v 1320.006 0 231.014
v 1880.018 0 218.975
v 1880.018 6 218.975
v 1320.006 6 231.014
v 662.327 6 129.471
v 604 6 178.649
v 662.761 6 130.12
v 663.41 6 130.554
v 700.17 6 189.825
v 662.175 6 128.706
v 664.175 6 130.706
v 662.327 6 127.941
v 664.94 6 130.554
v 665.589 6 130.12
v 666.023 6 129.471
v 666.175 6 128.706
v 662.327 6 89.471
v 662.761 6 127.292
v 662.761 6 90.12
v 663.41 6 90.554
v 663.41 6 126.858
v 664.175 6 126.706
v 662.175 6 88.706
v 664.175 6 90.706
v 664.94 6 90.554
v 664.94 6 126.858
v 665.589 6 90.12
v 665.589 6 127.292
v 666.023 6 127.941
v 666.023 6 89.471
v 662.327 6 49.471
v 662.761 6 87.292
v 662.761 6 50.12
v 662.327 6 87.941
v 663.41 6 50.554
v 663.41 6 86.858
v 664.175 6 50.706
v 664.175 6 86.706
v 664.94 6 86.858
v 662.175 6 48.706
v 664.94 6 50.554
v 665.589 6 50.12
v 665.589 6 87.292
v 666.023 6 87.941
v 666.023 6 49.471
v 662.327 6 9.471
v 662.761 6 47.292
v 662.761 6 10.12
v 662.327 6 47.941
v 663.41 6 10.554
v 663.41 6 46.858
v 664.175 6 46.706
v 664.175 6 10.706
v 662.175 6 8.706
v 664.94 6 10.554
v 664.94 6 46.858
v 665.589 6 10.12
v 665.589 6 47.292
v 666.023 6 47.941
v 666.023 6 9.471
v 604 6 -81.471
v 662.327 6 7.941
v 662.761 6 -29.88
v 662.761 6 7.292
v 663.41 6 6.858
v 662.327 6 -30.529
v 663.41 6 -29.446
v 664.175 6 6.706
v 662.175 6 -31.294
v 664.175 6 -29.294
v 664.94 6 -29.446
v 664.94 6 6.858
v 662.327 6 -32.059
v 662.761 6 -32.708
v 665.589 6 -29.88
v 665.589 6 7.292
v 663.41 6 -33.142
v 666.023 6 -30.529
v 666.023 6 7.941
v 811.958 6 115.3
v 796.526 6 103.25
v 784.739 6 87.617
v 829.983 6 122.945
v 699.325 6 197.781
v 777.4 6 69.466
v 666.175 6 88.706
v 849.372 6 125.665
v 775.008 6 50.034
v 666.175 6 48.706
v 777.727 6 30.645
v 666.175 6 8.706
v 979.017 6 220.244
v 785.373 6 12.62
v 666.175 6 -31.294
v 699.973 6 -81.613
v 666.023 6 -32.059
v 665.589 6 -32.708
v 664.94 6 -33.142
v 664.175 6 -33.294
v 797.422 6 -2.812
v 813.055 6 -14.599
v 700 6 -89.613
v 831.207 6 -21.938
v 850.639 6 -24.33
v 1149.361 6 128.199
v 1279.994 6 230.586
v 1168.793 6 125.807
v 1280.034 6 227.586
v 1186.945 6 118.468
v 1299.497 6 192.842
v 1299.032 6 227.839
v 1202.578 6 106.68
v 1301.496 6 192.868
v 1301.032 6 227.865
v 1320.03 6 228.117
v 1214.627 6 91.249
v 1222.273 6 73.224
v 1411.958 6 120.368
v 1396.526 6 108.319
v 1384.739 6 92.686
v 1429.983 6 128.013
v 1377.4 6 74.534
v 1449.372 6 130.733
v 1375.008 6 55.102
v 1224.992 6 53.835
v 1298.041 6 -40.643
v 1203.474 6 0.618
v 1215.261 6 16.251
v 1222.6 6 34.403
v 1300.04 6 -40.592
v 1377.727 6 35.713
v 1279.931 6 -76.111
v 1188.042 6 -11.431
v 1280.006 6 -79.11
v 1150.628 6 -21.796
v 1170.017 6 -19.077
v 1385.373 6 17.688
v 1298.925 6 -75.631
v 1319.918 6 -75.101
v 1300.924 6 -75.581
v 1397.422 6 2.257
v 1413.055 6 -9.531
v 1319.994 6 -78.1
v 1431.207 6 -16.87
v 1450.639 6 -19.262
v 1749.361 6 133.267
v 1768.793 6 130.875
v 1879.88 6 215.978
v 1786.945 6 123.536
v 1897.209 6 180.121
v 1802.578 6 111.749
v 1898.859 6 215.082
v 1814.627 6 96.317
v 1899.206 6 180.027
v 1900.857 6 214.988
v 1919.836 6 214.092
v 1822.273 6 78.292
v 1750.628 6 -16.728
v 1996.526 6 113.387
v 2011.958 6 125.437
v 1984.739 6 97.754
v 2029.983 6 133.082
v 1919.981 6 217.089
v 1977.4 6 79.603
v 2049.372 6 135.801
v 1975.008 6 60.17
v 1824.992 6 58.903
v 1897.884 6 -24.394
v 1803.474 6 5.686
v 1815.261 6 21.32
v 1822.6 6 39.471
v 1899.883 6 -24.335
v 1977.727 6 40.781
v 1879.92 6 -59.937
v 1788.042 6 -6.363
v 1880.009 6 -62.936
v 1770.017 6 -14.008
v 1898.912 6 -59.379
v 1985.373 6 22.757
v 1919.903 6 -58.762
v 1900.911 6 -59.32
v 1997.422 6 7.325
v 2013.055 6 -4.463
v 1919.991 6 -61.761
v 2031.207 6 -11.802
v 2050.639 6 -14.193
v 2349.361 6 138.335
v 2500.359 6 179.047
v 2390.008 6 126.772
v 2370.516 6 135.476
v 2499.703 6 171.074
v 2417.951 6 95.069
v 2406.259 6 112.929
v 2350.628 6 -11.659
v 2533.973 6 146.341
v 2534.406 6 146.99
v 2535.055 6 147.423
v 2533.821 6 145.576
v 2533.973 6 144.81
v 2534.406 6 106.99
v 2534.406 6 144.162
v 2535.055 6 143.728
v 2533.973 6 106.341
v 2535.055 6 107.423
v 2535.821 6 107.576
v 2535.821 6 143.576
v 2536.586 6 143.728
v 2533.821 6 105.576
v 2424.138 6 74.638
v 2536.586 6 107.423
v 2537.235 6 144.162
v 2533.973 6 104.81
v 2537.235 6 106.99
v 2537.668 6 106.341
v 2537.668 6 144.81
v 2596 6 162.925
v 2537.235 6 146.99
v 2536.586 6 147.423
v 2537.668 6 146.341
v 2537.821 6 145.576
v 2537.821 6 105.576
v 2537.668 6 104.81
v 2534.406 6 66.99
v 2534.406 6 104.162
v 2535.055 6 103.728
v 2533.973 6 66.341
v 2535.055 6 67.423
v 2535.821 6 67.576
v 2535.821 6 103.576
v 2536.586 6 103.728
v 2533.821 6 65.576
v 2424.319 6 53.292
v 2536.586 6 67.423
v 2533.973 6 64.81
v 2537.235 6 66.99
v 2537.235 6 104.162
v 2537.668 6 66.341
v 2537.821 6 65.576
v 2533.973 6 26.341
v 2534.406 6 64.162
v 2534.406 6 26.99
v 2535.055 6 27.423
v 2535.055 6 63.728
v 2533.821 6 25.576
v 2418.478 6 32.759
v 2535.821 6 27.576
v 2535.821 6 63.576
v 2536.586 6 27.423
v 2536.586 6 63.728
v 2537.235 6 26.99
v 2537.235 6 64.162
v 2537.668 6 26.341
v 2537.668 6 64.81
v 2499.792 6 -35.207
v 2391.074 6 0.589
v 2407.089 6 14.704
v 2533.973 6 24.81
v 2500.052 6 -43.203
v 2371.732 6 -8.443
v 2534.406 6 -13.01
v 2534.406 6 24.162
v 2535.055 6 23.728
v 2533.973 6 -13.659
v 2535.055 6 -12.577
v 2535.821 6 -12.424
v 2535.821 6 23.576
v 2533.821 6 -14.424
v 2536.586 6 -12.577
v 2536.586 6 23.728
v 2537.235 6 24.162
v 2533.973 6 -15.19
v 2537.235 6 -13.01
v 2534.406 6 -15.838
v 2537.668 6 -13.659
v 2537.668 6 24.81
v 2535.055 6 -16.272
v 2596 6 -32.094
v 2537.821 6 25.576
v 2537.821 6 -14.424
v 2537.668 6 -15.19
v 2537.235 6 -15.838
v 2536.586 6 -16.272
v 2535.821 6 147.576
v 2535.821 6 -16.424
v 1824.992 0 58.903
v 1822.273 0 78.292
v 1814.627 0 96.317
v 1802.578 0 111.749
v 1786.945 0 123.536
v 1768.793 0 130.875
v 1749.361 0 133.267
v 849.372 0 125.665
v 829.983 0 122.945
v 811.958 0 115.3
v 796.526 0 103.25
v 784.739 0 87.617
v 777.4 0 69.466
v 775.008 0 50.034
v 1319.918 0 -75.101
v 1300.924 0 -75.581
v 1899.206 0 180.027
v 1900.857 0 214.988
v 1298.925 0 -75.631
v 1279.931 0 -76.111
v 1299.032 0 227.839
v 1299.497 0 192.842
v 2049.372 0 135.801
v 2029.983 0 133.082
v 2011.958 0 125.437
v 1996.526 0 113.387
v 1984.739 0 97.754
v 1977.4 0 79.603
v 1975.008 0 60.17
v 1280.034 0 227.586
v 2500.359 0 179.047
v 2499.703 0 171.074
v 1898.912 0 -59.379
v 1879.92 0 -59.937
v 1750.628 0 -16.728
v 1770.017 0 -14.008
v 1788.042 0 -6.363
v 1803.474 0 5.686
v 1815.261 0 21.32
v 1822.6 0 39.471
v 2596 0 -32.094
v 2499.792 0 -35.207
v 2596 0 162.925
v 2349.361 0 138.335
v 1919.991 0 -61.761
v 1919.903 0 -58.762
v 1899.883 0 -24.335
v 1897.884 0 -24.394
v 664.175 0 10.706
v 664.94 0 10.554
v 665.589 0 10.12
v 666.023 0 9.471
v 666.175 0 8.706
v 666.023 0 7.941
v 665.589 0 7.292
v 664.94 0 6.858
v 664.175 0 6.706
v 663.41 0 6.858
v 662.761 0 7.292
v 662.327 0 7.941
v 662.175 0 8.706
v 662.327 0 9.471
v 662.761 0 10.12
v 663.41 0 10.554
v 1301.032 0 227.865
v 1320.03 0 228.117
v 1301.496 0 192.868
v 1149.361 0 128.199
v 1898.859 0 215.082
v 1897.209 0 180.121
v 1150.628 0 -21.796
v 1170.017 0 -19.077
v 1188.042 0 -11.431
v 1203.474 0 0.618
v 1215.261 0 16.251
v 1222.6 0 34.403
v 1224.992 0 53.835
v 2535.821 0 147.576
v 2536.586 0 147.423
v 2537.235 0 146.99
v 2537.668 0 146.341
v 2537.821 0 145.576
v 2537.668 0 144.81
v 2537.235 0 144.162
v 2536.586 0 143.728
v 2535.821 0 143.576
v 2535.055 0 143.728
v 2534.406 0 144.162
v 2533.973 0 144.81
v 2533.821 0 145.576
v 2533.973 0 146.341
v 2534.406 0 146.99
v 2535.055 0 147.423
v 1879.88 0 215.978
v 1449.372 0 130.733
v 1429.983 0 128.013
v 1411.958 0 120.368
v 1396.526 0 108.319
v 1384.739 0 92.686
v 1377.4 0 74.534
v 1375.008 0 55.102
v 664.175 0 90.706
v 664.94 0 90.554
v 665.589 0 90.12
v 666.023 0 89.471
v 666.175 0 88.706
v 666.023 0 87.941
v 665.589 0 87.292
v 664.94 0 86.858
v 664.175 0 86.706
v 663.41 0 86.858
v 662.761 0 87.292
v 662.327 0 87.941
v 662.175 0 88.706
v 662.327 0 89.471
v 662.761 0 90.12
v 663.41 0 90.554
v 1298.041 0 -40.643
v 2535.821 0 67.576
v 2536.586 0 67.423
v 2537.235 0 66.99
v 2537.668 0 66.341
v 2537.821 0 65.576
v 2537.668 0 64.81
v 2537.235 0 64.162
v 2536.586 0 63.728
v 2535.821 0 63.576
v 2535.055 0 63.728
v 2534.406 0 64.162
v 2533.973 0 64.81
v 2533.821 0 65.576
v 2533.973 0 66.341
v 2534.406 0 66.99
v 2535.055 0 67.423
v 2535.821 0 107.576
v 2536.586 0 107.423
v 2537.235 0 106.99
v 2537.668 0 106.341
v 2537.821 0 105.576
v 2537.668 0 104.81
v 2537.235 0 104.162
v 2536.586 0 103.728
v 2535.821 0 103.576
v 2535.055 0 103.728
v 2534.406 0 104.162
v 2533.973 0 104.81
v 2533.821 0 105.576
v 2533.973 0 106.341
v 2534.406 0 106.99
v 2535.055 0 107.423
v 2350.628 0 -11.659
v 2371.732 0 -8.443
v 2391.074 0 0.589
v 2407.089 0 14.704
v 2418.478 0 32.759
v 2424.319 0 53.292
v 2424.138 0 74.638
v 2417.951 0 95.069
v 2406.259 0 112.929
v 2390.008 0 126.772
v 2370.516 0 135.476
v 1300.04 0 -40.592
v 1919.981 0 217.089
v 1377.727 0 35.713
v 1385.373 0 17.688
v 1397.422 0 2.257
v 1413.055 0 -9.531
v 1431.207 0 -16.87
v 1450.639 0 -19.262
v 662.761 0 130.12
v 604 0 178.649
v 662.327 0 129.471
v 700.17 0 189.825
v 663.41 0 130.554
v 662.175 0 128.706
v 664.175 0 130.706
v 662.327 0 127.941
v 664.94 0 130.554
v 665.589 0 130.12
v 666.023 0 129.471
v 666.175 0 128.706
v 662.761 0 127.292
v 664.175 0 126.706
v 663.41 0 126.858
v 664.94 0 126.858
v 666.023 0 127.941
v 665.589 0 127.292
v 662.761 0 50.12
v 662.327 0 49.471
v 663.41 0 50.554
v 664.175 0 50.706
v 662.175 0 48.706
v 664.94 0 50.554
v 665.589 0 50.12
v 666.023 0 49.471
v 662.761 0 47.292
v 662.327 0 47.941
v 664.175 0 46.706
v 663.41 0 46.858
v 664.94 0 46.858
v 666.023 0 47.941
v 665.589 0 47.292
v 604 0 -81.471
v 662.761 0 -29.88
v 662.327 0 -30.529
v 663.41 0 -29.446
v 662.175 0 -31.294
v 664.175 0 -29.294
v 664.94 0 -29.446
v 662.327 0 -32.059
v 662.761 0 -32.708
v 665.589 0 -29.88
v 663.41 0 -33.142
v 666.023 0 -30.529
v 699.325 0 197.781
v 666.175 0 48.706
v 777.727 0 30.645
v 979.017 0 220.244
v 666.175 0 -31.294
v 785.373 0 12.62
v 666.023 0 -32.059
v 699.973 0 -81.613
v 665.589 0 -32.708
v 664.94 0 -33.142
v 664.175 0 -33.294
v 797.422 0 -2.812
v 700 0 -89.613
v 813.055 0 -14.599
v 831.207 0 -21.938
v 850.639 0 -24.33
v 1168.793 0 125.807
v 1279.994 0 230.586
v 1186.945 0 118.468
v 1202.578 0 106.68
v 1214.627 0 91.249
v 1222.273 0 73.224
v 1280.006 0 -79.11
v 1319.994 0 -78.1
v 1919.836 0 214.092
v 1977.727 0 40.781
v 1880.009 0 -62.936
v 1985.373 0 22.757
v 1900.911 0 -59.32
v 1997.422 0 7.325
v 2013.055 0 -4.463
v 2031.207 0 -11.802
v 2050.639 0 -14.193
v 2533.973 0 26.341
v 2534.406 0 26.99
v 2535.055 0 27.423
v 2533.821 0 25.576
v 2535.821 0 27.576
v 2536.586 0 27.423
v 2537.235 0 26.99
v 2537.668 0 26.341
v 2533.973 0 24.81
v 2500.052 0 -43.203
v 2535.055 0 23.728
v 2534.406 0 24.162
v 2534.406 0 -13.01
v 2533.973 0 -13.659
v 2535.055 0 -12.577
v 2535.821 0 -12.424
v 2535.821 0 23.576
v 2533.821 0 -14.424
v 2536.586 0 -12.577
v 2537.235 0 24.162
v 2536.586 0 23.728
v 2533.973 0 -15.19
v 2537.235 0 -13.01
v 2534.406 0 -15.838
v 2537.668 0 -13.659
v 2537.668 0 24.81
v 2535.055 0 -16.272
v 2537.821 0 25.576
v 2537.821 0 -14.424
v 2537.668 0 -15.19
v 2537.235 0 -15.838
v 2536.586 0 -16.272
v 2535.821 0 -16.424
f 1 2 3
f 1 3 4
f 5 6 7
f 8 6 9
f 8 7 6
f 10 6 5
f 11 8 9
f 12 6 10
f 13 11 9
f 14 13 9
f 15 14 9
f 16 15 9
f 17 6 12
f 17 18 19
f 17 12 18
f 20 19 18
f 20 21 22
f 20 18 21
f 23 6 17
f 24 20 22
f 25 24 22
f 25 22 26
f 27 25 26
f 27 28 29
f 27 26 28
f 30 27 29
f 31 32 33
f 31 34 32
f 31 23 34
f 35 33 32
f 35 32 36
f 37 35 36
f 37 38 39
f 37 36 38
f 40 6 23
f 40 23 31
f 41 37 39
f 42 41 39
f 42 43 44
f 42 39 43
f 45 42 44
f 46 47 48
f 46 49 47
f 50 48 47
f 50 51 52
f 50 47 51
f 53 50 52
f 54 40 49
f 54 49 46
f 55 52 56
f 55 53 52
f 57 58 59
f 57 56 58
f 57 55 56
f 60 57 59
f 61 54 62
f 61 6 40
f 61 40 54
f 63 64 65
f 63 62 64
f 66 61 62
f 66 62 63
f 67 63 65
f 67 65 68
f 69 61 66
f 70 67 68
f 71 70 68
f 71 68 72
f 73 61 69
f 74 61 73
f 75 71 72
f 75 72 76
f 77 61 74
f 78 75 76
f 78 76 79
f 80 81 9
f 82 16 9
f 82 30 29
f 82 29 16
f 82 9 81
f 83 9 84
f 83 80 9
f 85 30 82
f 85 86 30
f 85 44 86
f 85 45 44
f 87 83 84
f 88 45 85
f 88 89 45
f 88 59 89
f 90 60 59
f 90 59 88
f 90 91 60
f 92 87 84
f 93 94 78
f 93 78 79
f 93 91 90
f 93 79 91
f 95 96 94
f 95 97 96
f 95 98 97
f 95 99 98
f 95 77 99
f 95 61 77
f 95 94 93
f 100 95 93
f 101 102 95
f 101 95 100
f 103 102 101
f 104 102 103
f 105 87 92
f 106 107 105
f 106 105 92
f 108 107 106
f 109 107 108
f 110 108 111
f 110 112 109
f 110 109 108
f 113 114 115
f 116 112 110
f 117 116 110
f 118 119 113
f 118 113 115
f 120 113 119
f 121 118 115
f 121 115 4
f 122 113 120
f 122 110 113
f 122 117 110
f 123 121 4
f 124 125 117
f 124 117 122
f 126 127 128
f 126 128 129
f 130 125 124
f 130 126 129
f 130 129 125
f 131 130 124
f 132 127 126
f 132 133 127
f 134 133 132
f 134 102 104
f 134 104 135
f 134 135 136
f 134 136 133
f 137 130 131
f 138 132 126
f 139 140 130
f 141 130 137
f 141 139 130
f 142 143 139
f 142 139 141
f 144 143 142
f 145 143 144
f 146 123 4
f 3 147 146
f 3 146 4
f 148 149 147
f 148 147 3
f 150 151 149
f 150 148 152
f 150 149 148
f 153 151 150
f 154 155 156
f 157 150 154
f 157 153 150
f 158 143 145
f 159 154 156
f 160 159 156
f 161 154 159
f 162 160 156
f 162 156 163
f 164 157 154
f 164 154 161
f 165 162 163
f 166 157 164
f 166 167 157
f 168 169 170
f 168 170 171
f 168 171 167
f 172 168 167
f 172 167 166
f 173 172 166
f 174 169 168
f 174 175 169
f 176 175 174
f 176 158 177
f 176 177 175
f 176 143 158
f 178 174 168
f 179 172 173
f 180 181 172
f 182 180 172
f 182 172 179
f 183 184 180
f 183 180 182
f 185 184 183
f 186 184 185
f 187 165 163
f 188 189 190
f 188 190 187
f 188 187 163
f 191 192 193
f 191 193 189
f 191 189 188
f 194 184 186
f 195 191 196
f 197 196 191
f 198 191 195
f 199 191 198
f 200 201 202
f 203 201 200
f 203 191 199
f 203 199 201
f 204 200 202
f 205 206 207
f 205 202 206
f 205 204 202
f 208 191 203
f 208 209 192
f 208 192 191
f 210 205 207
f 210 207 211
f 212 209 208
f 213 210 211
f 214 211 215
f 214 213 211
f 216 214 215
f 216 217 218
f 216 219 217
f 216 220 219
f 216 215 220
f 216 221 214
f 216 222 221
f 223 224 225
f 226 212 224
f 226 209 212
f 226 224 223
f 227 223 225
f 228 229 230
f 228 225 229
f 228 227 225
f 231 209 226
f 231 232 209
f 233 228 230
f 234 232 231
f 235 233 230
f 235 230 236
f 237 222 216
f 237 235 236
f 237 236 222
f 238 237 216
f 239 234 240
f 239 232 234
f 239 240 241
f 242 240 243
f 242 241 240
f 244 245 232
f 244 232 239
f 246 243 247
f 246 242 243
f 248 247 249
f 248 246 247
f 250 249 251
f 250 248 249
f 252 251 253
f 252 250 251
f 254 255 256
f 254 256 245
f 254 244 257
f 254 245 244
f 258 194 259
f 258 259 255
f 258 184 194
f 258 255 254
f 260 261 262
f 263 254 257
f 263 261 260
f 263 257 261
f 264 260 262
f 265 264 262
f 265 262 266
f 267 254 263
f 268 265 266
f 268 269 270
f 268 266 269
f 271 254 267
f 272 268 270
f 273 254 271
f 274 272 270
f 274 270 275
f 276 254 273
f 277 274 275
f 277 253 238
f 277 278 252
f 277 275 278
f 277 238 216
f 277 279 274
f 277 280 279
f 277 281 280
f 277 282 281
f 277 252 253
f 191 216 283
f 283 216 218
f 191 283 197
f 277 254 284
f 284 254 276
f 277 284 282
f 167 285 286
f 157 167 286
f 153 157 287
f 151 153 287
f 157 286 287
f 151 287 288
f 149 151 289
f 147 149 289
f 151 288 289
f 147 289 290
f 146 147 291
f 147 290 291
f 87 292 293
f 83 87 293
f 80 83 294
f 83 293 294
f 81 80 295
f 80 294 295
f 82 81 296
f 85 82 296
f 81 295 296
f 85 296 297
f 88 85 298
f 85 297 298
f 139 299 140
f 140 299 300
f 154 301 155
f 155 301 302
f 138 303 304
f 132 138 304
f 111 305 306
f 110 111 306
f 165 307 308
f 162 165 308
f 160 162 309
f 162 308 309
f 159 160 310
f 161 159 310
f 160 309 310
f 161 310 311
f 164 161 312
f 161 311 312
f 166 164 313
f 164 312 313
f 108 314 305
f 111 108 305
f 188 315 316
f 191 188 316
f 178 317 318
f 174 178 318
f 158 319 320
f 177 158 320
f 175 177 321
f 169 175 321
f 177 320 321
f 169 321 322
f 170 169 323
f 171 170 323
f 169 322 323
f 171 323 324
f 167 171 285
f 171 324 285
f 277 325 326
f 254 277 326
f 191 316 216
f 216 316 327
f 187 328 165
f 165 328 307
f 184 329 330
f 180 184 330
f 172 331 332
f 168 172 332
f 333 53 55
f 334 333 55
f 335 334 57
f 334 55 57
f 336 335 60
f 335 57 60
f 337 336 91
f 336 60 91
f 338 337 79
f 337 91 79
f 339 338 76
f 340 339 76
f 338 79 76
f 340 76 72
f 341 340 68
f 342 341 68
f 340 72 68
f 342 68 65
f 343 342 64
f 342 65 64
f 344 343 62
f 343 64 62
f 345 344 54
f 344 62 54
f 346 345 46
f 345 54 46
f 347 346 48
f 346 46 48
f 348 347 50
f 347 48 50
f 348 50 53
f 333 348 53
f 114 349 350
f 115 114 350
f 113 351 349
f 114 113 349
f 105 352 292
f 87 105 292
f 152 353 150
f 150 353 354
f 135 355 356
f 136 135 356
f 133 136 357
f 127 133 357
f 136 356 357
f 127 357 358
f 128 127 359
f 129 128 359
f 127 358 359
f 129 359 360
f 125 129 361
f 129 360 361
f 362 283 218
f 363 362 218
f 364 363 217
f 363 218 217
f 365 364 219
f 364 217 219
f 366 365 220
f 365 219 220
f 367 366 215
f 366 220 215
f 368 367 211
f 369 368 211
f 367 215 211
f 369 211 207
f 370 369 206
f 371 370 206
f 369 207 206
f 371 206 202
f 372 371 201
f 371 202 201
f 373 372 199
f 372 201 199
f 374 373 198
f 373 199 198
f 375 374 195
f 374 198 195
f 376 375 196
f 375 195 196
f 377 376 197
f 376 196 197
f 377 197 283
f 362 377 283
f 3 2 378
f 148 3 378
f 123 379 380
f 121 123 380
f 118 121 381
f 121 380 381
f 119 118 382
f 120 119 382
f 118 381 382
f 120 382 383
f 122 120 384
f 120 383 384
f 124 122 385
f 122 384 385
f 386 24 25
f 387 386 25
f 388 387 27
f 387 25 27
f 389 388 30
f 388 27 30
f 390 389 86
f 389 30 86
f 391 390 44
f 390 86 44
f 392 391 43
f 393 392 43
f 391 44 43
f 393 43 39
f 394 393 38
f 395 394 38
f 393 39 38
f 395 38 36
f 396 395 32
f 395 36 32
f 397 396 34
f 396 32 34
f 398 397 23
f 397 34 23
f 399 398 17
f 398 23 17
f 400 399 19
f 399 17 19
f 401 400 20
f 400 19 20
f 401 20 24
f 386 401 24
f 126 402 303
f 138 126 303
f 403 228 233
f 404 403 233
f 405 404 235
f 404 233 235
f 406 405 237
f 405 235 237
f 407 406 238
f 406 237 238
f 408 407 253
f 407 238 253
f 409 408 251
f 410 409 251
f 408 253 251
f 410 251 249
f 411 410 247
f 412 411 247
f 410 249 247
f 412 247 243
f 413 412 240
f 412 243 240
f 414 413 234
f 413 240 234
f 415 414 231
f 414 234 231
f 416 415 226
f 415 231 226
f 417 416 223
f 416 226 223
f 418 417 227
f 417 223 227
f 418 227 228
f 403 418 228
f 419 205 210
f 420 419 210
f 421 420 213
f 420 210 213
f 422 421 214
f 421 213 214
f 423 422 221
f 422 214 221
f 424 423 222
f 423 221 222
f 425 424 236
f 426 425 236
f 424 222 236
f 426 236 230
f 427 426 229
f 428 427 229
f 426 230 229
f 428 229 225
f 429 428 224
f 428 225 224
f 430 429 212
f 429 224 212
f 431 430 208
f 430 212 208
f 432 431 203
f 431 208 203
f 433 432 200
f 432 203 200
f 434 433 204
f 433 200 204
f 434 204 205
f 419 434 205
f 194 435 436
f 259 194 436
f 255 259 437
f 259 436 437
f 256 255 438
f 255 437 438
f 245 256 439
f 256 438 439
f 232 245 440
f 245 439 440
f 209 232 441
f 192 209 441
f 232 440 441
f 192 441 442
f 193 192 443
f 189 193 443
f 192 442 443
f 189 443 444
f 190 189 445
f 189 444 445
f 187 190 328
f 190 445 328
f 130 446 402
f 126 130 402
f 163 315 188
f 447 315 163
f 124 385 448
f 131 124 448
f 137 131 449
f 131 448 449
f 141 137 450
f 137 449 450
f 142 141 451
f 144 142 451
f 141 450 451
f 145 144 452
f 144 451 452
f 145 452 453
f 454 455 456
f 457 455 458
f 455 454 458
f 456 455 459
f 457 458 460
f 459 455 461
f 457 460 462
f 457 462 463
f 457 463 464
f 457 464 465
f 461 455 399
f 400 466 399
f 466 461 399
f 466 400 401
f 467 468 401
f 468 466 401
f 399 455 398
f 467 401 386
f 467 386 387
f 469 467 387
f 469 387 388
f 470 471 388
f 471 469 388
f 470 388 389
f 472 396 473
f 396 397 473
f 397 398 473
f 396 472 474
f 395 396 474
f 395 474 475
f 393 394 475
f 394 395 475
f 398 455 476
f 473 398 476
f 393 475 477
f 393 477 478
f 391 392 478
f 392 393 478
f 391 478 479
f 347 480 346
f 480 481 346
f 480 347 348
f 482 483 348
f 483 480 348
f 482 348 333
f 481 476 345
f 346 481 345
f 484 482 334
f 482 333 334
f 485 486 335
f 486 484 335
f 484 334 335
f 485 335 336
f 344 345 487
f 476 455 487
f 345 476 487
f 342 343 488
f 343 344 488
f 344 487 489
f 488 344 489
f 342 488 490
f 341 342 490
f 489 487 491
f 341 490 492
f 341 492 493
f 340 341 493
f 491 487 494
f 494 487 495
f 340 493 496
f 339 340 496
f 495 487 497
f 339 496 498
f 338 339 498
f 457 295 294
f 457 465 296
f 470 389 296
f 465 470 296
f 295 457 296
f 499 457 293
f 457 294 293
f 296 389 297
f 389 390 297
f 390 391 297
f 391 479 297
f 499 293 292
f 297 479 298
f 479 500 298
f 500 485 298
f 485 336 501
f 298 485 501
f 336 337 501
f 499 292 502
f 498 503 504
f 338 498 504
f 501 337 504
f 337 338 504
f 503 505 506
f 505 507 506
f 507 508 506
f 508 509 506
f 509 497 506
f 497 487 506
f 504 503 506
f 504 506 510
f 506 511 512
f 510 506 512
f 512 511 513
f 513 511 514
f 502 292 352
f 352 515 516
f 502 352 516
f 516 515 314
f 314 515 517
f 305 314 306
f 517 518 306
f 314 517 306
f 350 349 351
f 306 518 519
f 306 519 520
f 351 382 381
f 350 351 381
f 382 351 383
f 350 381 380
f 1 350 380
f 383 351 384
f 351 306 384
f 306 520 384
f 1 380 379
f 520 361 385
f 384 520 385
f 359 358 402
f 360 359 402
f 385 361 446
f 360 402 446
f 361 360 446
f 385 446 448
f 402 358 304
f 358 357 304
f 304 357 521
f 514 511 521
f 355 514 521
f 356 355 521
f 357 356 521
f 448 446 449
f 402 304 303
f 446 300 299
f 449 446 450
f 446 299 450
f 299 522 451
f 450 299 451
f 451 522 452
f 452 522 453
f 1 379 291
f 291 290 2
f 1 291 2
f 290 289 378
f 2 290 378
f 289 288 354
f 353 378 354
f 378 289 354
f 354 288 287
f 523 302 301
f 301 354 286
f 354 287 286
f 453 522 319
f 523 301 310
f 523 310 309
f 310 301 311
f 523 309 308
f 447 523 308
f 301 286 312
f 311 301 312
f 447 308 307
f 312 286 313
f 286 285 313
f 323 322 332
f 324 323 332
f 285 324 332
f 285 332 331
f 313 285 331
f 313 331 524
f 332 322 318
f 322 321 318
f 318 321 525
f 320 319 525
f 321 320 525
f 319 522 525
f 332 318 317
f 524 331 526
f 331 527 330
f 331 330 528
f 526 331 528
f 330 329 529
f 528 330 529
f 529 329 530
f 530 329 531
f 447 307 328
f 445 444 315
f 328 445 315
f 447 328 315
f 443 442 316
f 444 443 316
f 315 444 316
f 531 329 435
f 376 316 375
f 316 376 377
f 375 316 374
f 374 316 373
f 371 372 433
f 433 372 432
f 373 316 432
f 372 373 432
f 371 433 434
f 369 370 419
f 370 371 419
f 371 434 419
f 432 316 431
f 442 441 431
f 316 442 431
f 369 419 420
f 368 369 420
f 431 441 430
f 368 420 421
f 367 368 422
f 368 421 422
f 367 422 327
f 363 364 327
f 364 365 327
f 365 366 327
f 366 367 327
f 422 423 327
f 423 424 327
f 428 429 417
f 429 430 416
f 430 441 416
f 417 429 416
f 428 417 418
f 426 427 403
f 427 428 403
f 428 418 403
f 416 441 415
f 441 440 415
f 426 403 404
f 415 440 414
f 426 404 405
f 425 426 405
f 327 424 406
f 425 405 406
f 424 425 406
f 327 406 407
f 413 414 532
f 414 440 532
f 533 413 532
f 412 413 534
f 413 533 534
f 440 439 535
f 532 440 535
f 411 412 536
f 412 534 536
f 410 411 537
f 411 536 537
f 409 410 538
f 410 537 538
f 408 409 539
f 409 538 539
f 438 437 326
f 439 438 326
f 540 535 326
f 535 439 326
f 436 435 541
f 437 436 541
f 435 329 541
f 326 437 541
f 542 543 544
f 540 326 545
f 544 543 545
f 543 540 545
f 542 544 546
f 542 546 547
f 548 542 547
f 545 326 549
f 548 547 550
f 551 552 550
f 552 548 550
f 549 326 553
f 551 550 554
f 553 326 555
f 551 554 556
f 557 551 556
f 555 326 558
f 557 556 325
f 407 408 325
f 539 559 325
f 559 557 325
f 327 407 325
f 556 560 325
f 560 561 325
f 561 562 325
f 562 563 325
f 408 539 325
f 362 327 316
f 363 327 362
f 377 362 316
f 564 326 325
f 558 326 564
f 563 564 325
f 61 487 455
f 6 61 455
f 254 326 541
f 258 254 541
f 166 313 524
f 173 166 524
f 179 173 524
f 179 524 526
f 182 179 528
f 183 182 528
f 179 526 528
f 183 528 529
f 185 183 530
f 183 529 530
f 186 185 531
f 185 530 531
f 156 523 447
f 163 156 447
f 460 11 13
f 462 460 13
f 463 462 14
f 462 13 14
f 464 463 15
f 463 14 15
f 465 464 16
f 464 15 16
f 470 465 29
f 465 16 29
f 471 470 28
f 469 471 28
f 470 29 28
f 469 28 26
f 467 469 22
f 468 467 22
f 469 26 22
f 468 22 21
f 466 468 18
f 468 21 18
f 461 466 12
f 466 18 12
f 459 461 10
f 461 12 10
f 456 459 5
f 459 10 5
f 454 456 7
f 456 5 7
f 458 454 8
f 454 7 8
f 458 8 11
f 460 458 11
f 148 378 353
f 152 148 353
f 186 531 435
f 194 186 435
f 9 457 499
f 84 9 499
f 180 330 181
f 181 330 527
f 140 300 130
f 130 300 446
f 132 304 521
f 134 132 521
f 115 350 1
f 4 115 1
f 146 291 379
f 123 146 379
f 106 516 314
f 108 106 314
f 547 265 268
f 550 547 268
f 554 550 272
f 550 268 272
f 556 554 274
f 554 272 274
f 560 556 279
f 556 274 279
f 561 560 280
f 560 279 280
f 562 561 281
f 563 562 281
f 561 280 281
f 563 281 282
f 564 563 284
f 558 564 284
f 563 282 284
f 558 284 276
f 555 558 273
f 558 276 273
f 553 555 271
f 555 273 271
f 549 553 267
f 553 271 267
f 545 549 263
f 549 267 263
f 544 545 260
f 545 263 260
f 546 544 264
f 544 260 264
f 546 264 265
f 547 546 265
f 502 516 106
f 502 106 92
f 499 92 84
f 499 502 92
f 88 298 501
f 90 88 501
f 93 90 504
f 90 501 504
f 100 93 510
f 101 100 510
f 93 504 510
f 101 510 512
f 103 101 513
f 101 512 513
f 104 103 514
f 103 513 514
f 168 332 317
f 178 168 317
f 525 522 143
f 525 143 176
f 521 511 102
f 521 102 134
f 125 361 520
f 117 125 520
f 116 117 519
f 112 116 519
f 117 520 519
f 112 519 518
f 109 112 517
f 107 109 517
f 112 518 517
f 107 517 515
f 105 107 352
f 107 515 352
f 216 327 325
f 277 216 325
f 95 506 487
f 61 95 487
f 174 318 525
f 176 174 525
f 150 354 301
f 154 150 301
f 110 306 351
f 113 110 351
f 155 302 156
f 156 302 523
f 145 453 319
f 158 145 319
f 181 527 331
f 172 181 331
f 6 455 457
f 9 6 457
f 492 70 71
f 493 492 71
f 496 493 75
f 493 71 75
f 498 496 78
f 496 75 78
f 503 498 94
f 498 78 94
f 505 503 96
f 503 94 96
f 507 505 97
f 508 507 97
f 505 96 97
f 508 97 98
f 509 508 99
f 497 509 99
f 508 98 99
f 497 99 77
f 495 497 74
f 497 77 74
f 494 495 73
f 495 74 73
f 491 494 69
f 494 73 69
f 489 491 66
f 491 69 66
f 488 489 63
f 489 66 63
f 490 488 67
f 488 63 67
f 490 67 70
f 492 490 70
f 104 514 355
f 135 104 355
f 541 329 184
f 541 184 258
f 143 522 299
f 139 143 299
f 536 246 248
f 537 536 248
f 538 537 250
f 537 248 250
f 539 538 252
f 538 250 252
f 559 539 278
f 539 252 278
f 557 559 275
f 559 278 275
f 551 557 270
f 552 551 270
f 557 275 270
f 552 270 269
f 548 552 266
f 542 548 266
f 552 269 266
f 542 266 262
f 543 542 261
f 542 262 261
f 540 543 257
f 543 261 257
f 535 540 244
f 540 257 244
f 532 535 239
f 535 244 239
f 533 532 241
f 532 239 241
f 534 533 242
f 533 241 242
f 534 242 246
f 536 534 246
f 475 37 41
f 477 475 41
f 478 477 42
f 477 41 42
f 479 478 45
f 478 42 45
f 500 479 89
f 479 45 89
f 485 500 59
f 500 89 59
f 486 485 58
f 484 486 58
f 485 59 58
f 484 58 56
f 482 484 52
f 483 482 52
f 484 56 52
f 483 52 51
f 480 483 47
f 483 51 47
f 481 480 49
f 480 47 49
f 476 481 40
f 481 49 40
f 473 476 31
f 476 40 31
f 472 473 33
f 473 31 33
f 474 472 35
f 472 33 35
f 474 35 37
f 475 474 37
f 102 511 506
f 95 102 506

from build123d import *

# Parameters (mm, degrees)
BOSS_EXTRUDE1_DEPTH   = 6
F_4_0MM_DOWEL_HOLE1_D = 4
F_4_0MM_DOWEL_HOLE2_D = 4


with BuildPart() as part:
    # Sketch1 → Boss-Extrude1 (new body)
    with BuildSketch(Plane(origin=(0, 0, 0), x_dir=(1, 0, 0), z_dir=(0, 1, 0))):
        with BuildLine():
            Line((2499.703486599, -171.073776325), (2596, -162.925319615))
            Line((2596, -162.925319615), (2596, -65.415893177))
            Line((2596, -65.415893177), (2424.991970984, -63.971373722))
            ThreePointArc((2424.991970984, -63.971373722), (2402.577804859, -116.816939936), (2349.361137771, -138.3351893))
            Line((2349.361137771, -138.3351893), (2049.371840186, -135.801154032))
            ThreePointArc((2049.371840186, -135.801154032), (1996.526273972, -113.386987906), (1975.008024607, -60.170320818))
            Line((1975.008024607, -60.170320818), (1824.991970984, -58.903122375))
            ThreePointArc((1824.991970984, -58.903122375), (1802.577804859, -111.74868859), (1749.361137771, -133.266937954))
            Line((1749.361137771, -133.266937954), (1449.371840186, -130.732902685))
            ThreePointArc((1449.371840186, -130.732902685), (1396.526273972, -108.31873656), (1375.008024607, -55.102069472))
            Line((1375.008024607, -55.102069472), (1224.991970984, -53.834871029))
            ThreePointArc((1224.991970984, -53.834871029), (1202.577804859, -106.680437244), (1149.361137771, -128.198686608))
            Line((1149.361137771, -128.198686608), (849.371840186, -125.664651339))
            ThreePointArc((849.371840186, -125.664651339), (796.526273972, -103.250485214), (775.008024607, -50.033818126))
            Line((775.008024607, -50.033818126), (603.999995592, -48.58929867))
            Line((603.999995592, -48.58929867), (603.999995592, -178.649131079))
            Line((603.999995592, -178.649131079), (700.169555672, -189.82522818))
            Line((700.169555672, -189.82522818), (699.325355788, -197.780561394))
            add(Edge.make_bspline(
                [(1279.993726967, -230.586145743), (1251.992845438, -230.214377978), (1156.643871099, -228.426153503), (993.973907449, -222.123757287), (828.430766092, -210.545808412), (730.308385941, -201.068402366), (699.325355788, -197.780561394)],
                knots=[0.338165656, 0.338165656, 0.338165656, 0.338165656, 0.348560819, 0.373566506, 0.398590699, 0.410156143, 0.410156143, 0.410156143, 0.410156143], degree=3))
            Line((1279.993726967, -230.586145743), (1280.033554464, -227.586410126))
            Line((1280.033554464, -227.586410126), (1299.031880037, -227.838650935))
            Line((1299.031880037, -227.838650935), (1299.496534159, -192.841735406))
            Line((1299.496534159, -192.841735406), (1301.496357904, -192.86828707))
            Line((1301.496357904, -192.86828707), (1301.031703781, -227.865202599))
            Line((1301.031703781, -227.865202599), (1320.030029354, -228.117443409))
            Line((1320.030029354, -228.117443409), (1320.006426802, -231.014189882))
            add(Edge.make_bspline(
                [(1880.017536915, -218.975094986), (1786.718289466, -223.252626978), (1600.105449253, -230.003314719), (1413.337833656, -231.774649729), (1320.006426802, -231.014189882)],
                knots=[0.263896993, 0.263896993, 0.263896993, 0.263896993, 0.298568064, 0.333214348, 0.333214348, 0.333214348, 0.333214348], degree=3))
            Line((1880.017536915, -218.975094986), (1879.880138913, -215.978243006))
            Line((1879.880138913, -215.978243006), (1898.859006014, -215.082361576))
            Line((1898.859006014, -215.082361576), (1897.208698115, -180.121290599))
            Line((1897.208698115, -180.121290599), (1899.2064736, -180.02698729))
            Line((1899.2064736, -180.02698729), (1900.856781499, -214.988058267))
            Line((1900.856781499, -214.988058267), (1919.8356486, -214.092176836))
            Line((1919.8356486, -214.092176836), (1919.981085174, -217.088649463))
            add(Edge.make_bspline(
                [(2500.358506516, -179.046915538), (2467.819448595, -181.720107419), (2301.688178219, -194.916310103), (2108.203569807, -207.523423052), (1947.177539067, -215.76864439), (1919.981085174, -217.088649463)],
                knots=[0.186972113, 0.186972113, 0.186972113, 0.186972113, 0.199092181, 0.248838609, 0.258946381, 0.258946381, 0.258946381, 0.258946381], degree=3))
            Line((2500.358506516, -179.046915538), (2499.703486599, -171.073776325))
        make_face()
        with BuildLine():
            Line((2499.792273349, 35.207087267), (2500.052462016, 43.202855013))
            add(Edge.make_bspline(
                [(1919.991369728, 61.760722375), (1946.141292077, 60.986188213), (2105.246296635, 56.201656656), (2298.592719455, 49.780680894), (2465.794842369, 44.317625311), (2500.052462016, 43.202855013)],
                knots=[0.742494138, 0.742494138, 0.742494138, 0.742494138, 0.752206114, 0.801585908, 0.814310206, 0.814310206, 0.814310206, 0.814310206], degree=3))
            Line((1919.991369728, 61.760722375), (1919.903226355, 58.762017531))
            Line((1919.903226355, 58.762017531), (1900.911429005, 59.320258891))
            Line((1900.911429005, 59.320258891), (1899.883089657, 24.335369036))
            Line((1899.883089657, 24.335369036), (1897.883953094, 24.394131284))
            Line((1897.883953094, 24.394131284), (1898.912292442, 59.379021139))
            Line((1898.912292442, 59.379021139), (1879.920499189, 59.93726238))
            Line((1879.920499189, 59.93726238), (1880.008642561, 62.935967224))
            add(Edge.make_bspline(
                [(1319.993980998, 78.100288692), (1413.331517369, 75.731088455), (1600.006544772, 70.824745257), (1786.675707055, 65.658872993), (1880.008642561, 62.935967224)],
                knots=[0.668220223, 0.668220223, 0.668220223, 0.668220223, 0.70288135, 0.737544363, 0.737544363, 0.737544363, 0.737544363], degree=3))
            Line((1319.993980998, 78.100288692), (1319.917856082, 75.101254681))
            Line((1319.917856082, 75.101254681), (1300.923911605, 75.580914146))
            Line((1300.923911605, 75.580914146), (1300.040328379, 40.592069057))
            Line((1300.040328379, 40.592069057), (1298.040965803, 40.642559527))
            Line((1298.040965803, 40.642559527), (1298.924549029, 75.631404616))
            Line((1298.924549029, 75.631404616), (1279.930604552, 76.111064082))
            Line((1279.930604552, 76.111064082), (1280.005946886, 79.110117855))
            add(Edge.make_bspline(
                [(699.999889789, 89.613058052), (735.879488596, 89.493405625), (837.870012607, 88.671897295), (1005.865228965, 85.782705717), (1163.311518707, 82.018687941), (1254.670838845, 79.746587332), (1280.005946886, 79.110117855)],
                knots=[0.591485773, 0.591485773, 0.591485773, 0.591485773, 0.604805069, 0.629344389, 0.653862178, 0.663270358, 0.663270358, 0.663270358, 0.663270358], degree=3))
            Line((699.999889789, 89.613058052), (699.973211283, 81.613102536))
            Line((699.973211283, 81.613102536), (603.999995592, 81.470533738))
            Line((603.999995592, 81.470533738), (603.999995592, -48.58929867))
            Line((603.999995592, -48.58929867), (775.008024607, -50.033818126))
            ThreePointArc((775.008024607, -50.033818126), (797.422190733, 2.811748089), (850.638857821, 24.329997453))
            Line((850.638857821, 24.329997453), (1150.628155405, 21.795962184))
            ThreePointArc((1150.628155405, 21.795962184), (1203.47372162, -0.618203941), (1224.991970984, -53.834871029))
            Line((1224.991970984, -53.834871029), (1375.008024607, -55.102069472))
            ThreePointArc((1375.008024607, -55.102069472), (1397.422190733, -2.256503257), (1450.638857821, 19.261746107))
            Line((1450.638857821, 19.261746107), (1750.628155405, 16.727710838))
            ThreePointArc((1750.628155405, 16.727710838), (1803.47372162, -5.686455287), (1824.991970984, -58.903122375))
            Line((1824.991970984, -58.903122375), (1975.008024607, -60.170320818))
            ThreePointArc((1975.008024607, -60.170320818), (1997.422190733, -7.324754603), (2050.638857821, 14.193494761))
            Line((2050.638857821, 14.193494761), (2350.628155405, 11.659459492))
            ThreePointArc((2350.628155405, 11.659459492), (2403.47372162, -10.754706634), (2424.991970984, -63.971373722))
            Line((2424.991970984, -63.971373722), (2596, -65.415893177))
            Line((2596, -65.415893177), (2596, 32.093533261))
            Line((2596, 32.093533261), (2499.792273349, 35.207087267))
        make_face()
    extrude(amount=BOSS_EXTRUDE1_DEPTH)

    # Ø4.0mm Dowel Hole1 (through all)
    with Locations(Plane(origin=(2535.820689775, 0, 65.575730663), x_dir=(0, 0, -1), z_dir=(0, -1, 0))):
        with Locations((0, 0), (-40, 0), (-80, 0), (40, 0), (80, 0)):
            Hole(F_4_0MM_DOWEL_HOLE1_D / 2)

    # Ø4.0mm Dowel Hole2 (through all)
    with Locations(Plane(origin=(664.175101974, 0, 48.706016617), x_dir=(0, 0, -1), z_dir=(0, -1, 0))):
        with Locations((0, 0), (-80, 0), (-40, 0), (80, 0), (40, 0)):
            Hole(F_4_0MM_DOWEL_HOLE2_D / 2)


solid = part.part
